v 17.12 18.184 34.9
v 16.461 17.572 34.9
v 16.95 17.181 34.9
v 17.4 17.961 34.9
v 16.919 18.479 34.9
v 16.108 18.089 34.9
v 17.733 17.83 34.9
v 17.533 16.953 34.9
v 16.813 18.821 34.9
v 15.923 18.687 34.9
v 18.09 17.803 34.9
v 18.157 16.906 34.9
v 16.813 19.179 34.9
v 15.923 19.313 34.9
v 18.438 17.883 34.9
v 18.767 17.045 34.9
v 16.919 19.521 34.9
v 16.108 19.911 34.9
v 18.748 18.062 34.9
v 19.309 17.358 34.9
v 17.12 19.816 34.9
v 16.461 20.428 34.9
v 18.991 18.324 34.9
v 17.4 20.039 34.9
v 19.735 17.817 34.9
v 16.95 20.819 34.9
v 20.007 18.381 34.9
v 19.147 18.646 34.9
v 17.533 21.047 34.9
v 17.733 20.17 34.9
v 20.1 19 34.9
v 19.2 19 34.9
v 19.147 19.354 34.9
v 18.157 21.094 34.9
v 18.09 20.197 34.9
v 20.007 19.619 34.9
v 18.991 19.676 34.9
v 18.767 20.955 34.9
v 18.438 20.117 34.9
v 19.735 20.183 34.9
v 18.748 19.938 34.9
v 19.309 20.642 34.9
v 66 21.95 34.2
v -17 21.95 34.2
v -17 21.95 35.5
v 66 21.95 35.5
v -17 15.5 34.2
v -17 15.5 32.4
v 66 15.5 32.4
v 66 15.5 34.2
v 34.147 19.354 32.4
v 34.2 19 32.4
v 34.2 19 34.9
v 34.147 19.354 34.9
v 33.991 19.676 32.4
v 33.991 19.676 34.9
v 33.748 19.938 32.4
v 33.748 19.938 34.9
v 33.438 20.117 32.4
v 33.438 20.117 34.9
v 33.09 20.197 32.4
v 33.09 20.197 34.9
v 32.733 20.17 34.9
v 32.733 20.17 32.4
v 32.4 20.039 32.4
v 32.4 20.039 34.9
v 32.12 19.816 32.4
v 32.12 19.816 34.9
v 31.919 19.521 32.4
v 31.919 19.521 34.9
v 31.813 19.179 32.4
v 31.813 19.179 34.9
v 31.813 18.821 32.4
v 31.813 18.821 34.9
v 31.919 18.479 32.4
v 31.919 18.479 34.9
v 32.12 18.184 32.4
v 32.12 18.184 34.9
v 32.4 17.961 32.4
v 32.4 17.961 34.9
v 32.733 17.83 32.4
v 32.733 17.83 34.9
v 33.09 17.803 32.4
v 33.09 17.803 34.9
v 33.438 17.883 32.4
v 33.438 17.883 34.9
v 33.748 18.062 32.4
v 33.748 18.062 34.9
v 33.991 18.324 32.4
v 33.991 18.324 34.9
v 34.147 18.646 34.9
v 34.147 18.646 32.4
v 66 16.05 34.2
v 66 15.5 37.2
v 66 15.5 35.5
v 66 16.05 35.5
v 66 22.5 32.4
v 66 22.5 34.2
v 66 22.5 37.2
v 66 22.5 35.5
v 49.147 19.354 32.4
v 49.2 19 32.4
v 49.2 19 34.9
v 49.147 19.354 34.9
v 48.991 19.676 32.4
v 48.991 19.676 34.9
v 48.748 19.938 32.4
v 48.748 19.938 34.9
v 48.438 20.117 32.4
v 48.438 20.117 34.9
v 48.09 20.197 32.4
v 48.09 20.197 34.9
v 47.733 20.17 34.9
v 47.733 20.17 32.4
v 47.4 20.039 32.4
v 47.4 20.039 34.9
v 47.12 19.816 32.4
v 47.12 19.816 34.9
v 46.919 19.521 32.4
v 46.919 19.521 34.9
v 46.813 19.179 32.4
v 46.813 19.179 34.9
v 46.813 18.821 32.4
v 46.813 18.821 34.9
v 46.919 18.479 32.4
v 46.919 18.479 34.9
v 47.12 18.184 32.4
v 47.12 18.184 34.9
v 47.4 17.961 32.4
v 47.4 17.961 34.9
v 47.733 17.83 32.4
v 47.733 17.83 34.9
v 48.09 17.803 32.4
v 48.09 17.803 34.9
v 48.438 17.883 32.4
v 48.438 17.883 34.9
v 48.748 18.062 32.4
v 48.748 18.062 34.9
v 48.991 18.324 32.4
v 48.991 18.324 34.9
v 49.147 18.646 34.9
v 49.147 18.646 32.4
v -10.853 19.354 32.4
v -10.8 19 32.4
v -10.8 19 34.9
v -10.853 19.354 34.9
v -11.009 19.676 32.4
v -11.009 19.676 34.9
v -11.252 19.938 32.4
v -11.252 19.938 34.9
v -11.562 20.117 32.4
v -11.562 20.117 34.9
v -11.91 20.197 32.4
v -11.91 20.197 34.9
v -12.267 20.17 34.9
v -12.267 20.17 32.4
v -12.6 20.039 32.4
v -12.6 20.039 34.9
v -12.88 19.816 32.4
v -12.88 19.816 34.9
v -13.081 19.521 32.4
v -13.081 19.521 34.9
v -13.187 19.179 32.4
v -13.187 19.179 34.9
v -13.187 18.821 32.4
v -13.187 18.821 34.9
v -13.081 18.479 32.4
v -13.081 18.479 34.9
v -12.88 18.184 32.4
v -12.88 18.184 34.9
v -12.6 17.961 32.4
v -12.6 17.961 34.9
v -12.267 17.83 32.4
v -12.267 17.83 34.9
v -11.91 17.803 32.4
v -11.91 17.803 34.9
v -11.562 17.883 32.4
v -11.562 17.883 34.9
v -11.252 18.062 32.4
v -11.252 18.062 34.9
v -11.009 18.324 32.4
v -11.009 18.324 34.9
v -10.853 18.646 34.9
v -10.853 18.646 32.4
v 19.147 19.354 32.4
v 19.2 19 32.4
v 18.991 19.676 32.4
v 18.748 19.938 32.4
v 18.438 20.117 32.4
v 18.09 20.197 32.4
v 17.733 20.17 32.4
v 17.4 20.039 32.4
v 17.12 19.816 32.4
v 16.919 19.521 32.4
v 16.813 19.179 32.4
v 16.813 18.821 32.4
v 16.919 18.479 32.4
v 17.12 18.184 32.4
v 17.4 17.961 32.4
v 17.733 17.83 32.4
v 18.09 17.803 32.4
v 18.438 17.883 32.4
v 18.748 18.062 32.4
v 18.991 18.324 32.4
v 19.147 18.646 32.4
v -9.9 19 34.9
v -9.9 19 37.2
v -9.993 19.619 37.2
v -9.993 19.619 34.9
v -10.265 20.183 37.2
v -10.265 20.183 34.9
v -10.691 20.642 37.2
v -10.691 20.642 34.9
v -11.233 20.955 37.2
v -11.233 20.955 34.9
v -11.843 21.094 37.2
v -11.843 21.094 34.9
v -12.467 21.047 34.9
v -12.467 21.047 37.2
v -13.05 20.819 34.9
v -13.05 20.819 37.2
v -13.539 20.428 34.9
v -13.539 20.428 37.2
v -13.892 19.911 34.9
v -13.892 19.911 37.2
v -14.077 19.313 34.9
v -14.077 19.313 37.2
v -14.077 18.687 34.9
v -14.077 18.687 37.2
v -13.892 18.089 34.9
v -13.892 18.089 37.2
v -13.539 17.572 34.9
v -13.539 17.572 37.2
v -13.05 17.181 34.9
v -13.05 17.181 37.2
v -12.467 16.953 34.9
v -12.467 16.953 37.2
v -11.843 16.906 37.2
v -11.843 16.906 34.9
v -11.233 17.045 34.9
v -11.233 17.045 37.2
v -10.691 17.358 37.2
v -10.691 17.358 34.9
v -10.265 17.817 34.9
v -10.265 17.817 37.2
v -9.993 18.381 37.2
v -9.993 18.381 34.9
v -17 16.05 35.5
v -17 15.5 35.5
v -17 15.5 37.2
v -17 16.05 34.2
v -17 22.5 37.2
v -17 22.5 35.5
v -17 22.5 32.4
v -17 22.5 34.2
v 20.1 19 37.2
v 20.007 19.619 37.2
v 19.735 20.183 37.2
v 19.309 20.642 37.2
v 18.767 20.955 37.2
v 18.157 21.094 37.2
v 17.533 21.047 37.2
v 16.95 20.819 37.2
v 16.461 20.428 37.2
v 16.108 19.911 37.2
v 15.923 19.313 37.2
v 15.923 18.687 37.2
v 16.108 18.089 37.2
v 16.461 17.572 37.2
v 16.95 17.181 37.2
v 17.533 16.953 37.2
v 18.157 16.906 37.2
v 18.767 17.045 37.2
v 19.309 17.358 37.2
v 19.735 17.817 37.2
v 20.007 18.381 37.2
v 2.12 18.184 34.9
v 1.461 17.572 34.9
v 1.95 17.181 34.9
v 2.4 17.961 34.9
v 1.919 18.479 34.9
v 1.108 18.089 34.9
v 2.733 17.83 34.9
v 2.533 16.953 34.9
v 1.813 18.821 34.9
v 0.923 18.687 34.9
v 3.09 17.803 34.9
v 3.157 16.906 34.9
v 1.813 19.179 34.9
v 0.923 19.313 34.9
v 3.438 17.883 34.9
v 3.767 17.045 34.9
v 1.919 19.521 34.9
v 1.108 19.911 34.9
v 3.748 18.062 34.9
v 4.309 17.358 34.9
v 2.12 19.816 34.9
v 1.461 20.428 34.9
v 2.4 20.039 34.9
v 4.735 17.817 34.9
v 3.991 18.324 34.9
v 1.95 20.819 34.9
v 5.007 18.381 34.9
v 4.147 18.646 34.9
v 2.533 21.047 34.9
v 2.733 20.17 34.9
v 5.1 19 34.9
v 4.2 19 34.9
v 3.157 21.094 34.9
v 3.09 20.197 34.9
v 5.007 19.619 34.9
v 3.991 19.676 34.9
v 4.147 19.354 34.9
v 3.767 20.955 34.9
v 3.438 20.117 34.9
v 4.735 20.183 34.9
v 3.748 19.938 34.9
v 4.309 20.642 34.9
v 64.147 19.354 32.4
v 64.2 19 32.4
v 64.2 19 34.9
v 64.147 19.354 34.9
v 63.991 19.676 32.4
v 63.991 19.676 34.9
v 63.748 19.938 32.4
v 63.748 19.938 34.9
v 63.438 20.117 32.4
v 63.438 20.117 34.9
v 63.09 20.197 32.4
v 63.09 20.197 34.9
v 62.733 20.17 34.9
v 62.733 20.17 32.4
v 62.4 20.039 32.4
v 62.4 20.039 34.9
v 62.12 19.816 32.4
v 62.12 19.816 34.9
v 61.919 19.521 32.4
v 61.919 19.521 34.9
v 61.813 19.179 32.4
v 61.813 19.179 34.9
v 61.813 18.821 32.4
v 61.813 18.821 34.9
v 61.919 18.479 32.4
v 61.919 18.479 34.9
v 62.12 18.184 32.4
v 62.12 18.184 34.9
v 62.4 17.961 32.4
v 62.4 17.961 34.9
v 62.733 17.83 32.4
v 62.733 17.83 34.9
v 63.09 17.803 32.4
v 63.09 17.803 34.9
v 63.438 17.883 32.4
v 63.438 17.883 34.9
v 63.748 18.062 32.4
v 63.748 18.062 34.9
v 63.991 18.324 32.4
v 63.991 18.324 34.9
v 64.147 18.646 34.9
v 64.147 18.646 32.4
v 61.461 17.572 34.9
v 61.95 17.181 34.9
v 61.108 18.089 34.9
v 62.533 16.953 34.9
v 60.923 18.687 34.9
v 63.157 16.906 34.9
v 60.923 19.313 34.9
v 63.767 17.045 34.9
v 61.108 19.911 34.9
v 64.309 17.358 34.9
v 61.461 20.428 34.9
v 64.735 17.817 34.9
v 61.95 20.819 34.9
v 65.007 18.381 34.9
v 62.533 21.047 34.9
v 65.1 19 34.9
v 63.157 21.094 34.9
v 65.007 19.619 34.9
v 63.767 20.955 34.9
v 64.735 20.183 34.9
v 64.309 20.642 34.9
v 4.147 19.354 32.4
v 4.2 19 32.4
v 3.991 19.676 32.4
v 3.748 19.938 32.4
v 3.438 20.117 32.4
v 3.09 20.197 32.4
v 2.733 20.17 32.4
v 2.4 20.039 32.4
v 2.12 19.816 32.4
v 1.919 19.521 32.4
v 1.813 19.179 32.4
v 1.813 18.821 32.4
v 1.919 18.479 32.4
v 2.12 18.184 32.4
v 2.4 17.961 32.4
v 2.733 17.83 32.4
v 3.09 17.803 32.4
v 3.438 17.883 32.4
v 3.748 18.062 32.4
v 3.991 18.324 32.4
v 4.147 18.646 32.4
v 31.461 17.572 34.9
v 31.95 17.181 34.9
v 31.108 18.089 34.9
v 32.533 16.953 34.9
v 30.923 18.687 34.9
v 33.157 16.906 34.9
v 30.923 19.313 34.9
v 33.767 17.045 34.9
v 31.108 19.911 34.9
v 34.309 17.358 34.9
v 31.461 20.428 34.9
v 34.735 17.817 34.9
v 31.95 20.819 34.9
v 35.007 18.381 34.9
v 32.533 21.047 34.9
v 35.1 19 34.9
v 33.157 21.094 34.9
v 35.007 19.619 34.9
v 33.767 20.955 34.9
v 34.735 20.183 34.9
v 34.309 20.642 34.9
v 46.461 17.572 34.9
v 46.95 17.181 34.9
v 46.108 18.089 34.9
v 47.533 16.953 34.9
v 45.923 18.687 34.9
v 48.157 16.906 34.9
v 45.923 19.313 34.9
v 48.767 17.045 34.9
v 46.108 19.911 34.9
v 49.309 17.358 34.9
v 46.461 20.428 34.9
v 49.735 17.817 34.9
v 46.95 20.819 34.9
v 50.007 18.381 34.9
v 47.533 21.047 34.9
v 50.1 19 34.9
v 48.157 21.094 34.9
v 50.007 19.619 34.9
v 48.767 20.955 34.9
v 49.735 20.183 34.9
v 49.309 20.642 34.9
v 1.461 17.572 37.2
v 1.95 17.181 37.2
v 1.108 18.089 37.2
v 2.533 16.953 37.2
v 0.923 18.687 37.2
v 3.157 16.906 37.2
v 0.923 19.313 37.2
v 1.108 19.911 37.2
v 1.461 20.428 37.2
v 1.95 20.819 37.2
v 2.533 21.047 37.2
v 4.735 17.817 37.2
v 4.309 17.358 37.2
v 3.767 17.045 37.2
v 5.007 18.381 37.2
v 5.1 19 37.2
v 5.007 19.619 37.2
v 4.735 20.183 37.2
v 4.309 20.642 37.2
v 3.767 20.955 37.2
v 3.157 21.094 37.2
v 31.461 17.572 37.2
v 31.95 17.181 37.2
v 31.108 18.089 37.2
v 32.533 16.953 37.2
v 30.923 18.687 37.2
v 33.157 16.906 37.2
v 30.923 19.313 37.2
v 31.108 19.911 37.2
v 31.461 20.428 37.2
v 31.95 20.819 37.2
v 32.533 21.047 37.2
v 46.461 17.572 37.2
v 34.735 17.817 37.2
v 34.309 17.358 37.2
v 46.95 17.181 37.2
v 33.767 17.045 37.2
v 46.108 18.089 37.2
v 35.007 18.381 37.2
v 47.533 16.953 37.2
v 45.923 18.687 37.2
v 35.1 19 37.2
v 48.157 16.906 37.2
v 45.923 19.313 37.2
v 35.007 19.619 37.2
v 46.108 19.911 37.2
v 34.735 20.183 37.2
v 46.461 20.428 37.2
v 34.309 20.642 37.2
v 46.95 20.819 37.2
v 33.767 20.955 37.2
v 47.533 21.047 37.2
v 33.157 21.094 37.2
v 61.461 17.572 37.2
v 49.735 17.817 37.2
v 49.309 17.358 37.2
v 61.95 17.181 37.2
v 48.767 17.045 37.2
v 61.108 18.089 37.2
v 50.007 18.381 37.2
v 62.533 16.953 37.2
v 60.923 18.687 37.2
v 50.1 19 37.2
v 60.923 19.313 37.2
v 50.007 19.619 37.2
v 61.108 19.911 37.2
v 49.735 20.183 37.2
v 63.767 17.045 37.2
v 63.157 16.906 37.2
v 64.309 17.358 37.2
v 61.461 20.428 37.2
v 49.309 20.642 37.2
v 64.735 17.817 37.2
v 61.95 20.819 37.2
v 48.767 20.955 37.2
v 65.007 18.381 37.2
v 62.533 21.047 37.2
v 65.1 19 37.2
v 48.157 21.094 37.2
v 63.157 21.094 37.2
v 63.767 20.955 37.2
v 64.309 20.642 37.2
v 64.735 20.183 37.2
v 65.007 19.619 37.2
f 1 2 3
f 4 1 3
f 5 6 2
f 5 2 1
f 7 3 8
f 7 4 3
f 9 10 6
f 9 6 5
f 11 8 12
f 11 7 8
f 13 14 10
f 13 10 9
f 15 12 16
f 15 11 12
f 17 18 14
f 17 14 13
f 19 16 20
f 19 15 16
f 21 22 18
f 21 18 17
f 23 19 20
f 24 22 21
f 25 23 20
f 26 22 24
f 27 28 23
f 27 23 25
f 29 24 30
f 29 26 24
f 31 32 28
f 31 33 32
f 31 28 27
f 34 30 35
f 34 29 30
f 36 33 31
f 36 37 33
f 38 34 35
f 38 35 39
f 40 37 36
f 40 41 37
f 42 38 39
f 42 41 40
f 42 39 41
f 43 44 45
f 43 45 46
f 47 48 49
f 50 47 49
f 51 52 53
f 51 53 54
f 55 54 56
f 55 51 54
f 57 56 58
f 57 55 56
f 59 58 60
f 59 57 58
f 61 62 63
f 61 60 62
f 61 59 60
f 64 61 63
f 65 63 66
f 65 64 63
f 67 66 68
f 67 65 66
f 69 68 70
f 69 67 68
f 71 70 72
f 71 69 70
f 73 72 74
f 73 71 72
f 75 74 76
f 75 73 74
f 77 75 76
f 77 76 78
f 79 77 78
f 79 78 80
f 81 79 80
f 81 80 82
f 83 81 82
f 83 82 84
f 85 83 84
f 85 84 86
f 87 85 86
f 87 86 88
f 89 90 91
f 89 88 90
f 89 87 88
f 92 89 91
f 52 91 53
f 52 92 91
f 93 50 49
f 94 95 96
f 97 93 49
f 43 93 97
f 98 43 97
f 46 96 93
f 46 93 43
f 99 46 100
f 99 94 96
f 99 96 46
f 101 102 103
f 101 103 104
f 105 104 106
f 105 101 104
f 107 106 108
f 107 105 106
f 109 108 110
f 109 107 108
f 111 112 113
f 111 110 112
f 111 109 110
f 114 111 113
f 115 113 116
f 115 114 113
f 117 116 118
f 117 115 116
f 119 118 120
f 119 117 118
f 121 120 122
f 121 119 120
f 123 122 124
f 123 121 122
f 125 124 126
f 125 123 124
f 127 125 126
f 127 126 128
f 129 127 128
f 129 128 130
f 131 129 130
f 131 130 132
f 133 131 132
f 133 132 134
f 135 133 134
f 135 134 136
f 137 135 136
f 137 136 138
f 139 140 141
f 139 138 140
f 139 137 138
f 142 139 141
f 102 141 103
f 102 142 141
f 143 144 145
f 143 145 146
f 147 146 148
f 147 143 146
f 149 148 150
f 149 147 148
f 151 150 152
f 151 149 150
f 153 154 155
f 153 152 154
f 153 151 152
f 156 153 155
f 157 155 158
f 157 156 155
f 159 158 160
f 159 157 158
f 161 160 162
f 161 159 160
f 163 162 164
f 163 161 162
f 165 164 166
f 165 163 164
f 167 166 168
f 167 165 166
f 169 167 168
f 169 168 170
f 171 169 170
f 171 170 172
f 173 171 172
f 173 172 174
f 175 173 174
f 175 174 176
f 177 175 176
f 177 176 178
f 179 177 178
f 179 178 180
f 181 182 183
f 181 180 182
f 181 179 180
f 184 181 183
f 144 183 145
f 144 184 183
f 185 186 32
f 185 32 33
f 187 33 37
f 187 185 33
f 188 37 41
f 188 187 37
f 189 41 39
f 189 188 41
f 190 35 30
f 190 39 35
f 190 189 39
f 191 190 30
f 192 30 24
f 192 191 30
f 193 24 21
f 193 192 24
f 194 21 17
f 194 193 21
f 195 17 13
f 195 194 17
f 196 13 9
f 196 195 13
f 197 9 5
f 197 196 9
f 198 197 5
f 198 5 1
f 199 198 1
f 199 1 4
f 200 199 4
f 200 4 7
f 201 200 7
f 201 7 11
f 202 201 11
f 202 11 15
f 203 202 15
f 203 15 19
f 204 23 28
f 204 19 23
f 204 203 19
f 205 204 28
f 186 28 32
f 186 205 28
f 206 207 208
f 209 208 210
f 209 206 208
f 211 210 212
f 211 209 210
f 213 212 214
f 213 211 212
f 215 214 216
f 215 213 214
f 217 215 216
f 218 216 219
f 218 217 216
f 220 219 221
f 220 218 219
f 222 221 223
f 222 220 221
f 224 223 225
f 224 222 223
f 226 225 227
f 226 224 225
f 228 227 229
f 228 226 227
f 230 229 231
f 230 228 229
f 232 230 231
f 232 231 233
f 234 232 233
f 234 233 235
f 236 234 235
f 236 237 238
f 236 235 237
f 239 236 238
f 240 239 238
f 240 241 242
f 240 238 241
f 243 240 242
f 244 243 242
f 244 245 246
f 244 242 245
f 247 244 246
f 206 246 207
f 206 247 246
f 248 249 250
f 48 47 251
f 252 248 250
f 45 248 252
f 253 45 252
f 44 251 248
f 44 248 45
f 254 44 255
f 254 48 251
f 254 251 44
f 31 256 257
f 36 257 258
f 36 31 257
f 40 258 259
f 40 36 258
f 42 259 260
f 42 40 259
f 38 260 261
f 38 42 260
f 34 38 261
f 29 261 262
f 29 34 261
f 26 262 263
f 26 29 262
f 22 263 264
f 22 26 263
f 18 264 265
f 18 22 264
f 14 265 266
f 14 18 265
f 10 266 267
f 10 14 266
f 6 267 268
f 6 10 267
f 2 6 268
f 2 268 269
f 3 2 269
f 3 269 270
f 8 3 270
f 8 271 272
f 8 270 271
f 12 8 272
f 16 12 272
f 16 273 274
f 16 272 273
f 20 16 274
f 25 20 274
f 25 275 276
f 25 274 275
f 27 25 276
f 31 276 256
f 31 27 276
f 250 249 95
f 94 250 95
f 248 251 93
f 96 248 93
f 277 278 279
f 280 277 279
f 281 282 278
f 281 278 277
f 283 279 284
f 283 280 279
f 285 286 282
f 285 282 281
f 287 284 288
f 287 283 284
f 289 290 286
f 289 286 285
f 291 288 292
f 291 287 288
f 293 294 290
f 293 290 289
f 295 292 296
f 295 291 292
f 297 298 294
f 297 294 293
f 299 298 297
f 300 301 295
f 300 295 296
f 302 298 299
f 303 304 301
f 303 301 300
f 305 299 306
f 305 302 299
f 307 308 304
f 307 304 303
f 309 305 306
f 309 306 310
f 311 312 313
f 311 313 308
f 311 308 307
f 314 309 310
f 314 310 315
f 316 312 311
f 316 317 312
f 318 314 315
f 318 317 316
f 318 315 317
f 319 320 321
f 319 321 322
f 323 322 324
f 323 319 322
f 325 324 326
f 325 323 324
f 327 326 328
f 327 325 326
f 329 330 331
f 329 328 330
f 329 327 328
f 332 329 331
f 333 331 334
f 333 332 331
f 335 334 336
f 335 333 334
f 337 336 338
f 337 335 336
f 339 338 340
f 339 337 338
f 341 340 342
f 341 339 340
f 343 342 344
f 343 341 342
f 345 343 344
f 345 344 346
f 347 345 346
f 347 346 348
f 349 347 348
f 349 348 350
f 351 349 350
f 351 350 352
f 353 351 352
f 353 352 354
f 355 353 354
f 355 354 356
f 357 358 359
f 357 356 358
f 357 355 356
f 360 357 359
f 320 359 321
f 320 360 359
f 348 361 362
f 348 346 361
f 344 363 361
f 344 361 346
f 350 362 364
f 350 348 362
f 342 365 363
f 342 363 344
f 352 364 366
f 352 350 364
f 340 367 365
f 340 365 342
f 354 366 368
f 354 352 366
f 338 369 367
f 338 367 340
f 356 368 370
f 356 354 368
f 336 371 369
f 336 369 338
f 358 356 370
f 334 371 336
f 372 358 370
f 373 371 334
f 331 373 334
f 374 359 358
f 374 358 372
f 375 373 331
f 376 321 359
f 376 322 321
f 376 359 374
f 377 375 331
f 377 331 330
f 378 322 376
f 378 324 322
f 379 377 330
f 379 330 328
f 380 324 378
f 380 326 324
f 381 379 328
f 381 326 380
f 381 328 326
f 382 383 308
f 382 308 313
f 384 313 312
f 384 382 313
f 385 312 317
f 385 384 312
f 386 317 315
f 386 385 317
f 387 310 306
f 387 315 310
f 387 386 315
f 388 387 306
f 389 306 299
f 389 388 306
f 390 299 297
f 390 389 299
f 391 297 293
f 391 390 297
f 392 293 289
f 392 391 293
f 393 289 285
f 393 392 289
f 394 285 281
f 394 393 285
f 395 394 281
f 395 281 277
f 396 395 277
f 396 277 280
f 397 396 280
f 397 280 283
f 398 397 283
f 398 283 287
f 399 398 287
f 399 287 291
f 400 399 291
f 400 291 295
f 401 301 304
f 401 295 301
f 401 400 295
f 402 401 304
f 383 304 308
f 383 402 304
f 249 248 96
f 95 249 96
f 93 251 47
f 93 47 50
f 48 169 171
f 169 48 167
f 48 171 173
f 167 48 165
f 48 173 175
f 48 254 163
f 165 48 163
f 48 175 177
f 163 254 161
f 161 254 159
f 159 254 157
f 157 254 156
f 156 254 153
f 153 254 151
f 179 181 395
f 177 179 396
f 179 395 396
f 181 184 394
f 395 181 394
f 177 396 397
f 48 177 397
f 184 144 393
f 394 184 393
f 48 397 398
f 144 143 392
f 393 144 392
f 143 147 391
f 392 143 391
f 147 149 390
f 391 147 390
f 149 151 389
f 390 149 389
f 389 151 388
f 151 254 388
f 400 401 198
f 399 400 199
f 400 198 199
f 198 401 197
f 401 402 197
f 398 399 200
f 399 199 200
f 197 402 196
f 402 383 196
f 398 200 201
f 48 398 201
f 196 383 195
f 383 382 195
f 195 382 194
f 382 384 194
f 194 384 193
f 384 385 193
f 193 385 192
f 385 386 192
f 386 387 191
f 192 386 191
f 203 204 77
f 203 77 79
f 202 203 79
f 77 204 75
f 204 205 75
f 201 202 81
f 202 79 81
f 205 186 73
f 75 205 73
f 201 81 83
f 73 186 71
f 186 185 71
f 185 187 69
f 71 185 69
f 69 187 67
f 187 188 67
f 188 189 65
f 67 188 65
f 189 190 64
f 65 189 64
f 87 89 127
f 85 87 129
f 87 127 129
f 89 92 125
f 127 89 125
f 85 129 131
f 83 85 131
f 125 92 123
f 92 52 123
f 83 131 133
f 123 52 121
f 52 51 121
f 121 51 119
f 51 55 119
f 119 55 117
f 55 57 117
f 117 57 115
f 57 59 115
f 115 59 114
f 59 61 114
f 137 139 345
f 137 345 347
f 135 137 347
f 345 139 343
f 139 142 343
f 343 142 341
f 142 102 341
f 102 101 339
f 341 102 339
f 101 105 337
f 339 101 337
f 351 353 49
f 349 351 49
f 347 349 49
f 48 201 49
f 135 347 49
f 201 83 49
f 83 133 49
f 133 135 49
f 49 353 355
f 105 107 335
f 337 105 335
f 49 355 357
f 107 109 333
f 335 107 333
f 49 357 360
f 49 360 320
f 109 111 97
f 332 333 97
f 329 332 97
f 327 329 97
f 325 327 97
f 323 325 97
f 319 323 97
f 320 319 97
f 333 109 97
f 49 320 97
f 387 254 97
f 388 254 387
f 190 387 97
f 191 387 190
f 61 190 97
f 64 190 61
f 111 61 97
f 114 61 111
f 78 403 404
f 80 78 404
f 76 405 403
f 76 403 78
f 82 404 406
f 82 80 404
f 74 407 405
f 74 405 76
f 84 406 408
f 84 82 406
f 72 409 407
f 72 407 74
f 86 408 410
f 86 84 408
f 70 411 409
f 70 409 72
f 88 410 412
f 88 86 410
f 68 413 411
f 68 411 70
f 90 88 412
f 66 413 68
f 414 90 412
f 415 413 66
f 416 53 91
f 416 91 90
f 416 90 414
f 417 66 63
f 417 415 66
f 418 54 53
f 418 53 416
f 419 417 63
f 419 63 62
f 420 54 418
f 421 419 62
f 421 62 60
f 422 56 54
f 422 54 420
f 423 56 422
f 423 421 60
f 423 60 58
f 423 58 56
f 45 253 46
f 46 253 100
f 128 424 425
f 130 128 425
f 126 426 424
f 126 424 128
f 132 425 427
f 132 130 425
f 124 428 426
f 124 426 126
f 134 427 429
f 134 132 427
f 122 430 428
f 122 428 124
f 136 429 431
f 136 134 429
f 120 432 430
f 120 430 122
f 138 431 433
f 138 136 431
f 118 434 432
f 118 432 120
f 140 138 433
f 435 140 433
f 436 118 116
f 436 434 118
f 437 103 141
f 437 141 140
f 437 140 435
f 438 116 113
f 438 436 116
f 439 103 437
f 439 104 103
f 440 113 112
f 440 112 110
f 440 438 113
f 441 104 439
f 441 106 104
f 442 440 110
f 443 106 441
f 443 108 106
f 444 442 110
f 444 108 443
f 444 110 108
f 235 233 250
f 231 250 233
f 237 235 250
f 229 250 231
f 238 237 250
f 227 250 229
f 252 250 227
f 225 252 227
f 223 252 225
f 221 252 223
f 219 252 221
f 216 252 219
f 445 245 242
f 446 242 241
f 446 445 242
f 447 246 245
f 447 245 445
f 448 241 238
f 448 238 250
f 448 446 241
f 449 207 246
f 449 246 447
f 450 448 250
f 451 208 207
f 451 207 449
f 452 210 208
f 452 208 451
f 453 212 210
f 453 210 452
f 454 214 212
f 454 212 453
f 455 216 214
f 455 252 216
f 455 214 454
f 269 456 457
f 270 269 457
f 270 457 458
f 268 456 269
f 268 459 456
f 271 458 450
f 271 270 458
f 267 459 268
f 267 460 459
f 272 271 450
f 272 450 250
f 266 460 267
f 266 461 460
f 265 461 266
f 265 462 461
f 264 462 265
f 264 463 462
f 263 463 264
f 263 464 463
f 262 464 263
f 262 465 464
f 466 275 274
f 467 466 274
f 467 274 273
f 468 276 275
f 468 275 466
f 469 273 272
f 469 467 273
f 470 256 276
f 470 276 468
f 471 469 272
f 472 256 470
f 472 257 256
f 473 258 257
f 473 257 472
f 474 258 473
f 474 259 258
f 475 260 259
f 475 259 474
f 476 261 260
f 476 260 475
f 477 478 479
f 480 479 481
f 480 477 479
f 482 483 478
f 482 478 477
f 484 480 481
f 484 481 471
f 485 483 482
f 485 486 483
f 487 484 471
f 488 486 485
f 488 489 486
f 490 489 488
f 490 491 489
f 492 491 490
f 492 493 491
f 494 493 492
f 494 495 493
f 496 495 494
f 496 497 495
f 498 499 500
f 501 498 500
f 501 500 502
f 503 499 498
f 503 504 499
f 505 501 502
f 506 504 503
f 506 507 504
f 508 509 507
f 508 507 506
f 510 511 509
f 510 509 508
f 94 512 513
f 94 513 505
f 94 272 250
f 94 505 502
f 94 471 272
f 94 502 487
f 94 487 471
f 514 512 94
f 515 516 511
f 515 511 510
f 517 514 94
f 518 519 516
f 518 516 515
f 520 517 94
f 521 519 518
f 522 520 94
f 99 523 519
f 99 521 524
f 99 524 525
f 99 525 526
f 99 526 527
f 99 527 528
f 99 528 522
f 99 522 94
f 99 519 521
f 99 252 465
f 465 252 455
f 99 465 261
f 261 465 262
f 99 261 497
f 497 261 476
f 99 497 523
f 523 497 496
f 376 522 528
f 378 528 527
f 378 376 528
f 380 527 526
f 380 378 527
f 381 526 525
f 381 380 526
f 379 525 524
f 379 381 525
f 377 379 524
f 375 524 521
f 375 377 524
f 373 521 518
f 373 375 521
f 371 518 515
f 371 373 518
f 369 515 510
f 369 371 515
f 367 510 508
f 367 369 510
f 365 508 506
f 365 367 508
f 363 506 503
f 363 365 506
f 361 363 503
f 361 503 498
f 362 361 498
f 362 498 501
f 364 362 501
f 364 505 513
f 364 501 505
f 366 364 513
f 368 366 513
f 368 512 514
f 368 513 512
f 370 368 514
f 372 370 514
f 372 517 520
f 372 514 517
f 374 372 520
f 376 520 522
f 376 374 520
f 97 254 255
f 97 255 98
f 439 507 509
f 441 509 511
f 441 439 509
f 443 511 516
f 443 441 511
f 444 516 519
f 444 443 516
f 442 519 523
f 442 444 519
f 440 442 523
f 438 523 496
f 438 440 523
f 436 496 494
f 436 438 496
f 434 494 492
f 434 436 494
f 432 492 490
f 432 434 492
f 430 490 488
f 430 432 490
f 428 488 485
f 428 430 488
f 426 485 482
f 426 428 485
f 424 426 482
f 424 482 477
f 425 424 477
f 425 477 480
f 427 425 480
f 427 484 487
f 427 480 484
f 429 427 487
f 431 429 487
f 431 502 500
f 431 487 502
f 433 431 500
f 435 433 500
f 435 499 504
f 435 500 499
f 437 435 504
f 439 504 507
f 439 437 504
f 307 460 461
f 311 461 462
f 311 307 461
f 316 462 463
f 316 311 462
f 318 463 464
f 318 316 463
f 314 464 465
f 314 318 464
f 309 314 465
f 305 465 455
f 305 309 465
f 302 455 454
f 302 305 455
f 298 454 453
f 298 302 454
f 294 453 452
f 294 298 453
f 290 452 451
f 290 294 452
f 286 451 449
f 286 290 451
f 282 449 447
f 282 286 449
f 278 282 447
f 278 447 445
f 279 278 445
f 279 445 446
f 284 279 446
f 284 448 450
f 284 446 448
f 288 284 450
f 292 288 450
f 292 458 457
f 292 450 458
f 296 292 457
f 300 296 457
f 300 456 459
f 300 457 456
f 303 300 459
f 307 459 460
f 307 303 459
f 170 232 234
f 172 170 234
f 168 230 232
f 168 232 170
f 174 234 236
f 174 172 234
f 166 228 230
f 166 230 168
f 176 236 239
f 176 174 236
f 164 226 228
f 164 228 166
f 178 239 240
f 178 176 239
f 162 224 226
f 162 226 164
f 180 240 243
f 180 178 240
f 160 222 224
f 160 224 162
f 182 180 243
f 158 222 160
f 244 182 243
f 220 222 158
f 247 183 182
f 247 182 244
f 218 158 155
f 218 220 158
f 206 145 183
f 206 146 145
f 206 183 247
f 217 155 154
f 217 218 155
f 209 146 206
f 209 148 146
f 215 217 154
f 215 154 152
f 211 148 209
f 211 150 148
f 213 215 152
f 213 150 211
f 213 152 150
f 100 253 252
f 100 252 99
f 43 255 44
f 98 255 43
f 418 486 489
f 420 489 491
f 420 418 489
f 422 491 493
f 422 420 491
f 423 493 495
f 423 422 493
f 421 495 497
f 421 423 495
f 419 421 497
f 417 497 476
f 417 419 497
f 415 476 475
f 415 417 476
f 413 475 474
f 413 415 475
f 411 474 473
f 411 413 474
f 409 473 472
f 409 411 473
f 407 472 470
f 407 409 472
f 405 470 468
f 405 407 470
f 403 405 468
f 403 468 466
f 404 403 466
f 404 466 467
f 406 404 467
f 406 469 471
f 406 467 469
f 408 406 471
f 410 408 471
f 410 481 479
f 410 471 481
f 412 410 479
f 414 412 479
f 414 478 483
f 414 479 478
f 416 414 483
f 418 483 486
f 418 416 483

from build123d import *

# Parameters (mm, degrees)
F_100_START                                  = 32.4
F_100_MM_MGN7_RAIL_7_X_4_8_MM_PROFILE_W      = 100
F_100_MM_MGN7_RAIL_7_X_4_8_MM_PROFILE_H      = 7
F_100_MM_MGN7_RAIL_7_X_4_8_MM_DEPTH          = 4.8
NOMINAL_START                                = 34.2
NOMINAL_RACEWAY_CLEARANCE_PROFILE_W          = 100.2
NOMINAL_RACEWAY_CLEARANCE_PROFILE_H          = 1.05
NOMINAL_RACEWAY_CLEARANCE_DEPTH              = 1.3
SEVEN_START                                  = 32.3
SEVEN_RAIL_MOUNTING_HOLES_15_MM_PITCH_PR_R   = 1.2
SEVEN_RAIL_MOUNTING_HOLES_15_MM_PITCH_DEPTH  = 5
M2_START                                     = 34.9
M2_RAIL_BOLT_COUNTERBORES_DIAMETER_4_2_P_R   = 2.1
M2_RAIL_BOLT_COUNTERBORES_DIAMETER_4_2_DEPTH = 2.4
SKETCH_1_W                                   = 17
SKETCH_1_H                                   = 7
CUT_EXTRUDE_1_DEPTH                          = 10


with BuildPart() as part:
    # 100 mm MGN7 rail 7 x 4.8 mm profile → 100 mm MGN7 rail 7 x 4.8 mm (new body)
    with BuildSketch(Plane.XY.offset(F_100_START)):
        with Locations((33, 19)):
            Rectangle(F_100_MM_MGN7_RAIL_7_X_4_8_MM_PROFILE_W, F_100_MM_MGN7_RAIL_7_X_4_8_MM_PROFILE_H)
    extrude(amount=F_100_MM_MGN7_RAIL_7_X_4_8_MM_DEPTH)

    # Nominal raceway clearance profile → Nominal raceway clearance (cut)
    with BuildSketch(Plane.XY.offset(NOMINAL_START)):
        with Locations((33, 15.525)):
            Rectangle(NOMINAL_RACEWAY_CLEARANCE_PROFILE_W, NOMINAL_RACEWAY_CLEARANCE_PROFILE_H)
        with Locations((33, 22.475)):
            Rectangle(NOMINAL_RACEWAY_CLEARANCE_PROFILE_W, NOMINAL_RACEWAY_CLEARANCE_PROFILE_H)
    extrude(amount=NOMINAL_RACEWAY_CLEARANCE_DEPTH, mode=Mode.SUBTRACT)

    # Seven rail mounting holes 15 mm pitch profile → Seven rail mounting holes 15 mm pitch (cut)
    with BuildSketch(Plane.XY.offset(SEVEN_START)):
        with Locations((-12, 19)):
            Circle(SEVEN_RAIL_MOUNTING_HOLES_15_MM_PITCH_PR_R)
        with Locations((3, 19)):
            Circle(SEVEN_RAIL_MOUNTING_HOLES_15_MM_PITCH_PR_R)
        with Locations((18, 19)):
            Circle(SEVEN_RAIL_MOUNTING_HOLES_15_MM_PITCH_PR_R)
        with Locations((33, 19)):
            Circle(SEVEN_RAIL_MOUNTING_HOLES_15_MM_PITCH_PR_R)
        with Locations((48, 19)):
            Circle(SEVEN_RAIL_MOUNTING_HOLES_15_MM_PITCH_PR_R)
        with Locations((63, 19)):
            Circle(SEVEN_RAIL_MOUNTING_HOLES_15_MM_PITCH_PR_R)
        with Locations((78, 19)):
            Circle(SEVEN_RAIL_MOUNTING_HOLES_15_MM_PITCH_PR_R)
    extrude(amount=SEVEN_RAIL_MOUNTING_HOLES_15_MM_PITCH_DEPTH, mode=Mode.SUBTRACT)

    # M2 rail bolt counterbores diameter 4.2 profile → M2 rail bolt counterbores diameter 4.2 (cut)
    with BuildSketch(Plane.XY.offset(M2_START)):
        with Locations((-12, 19)):
            Circle(M2_RAIL_BOLT_COUNTERBORES_DIAMETER_4_2_P_R)
        with Locations((3, 19)):
            Circle(M2_RAIL_BOLT_COUNTERBORES_DIAMETER_4_2_P_R)
        with Locations((18, 19)):
            Circle(M2_RAIL_BOLT_COUNTERBORES_DIAMETER_4_2_P_R)
        with Locations((33, 19)):
            Circle(M2_RAIL_BOLT_COUNTERBORES_DIAMETER_4_2_P_R)
        with Locations((48, 19)):
            Circle(M2_RAIL_BOLT_COUNTERBORES_DIAMETER_4_2_P_R)
        with Locations((63, 19)):
            Circle(M2_RAIL_BOLT_COUNTERBORES_DIAMETER_4_2_P_R)
        with Locations((78, 19)):
            Circle(M2_RAIL_BOLT_COUNTERBORES_DIAMETER_4_2_P_R)
    extrude(amount=M2_RAIL_BOLT_COUNTERBORES_DIAMETER_4_2_DEPTH, mode=Mode.SUBTRACT)

    # 草图1 → 切除-拉伸1 (cut)
    with BuildSketch(Plane.XY.offset(37.2)):
        with Locations((74.5, 19)):
            Rectangle(SKETCH_1_W, SKETCH_1_H)
    extrude(amount=-CUT_EXTRUDE_1_DEPTH, mode=Mode.SUBTRACT)


solid = part.part
